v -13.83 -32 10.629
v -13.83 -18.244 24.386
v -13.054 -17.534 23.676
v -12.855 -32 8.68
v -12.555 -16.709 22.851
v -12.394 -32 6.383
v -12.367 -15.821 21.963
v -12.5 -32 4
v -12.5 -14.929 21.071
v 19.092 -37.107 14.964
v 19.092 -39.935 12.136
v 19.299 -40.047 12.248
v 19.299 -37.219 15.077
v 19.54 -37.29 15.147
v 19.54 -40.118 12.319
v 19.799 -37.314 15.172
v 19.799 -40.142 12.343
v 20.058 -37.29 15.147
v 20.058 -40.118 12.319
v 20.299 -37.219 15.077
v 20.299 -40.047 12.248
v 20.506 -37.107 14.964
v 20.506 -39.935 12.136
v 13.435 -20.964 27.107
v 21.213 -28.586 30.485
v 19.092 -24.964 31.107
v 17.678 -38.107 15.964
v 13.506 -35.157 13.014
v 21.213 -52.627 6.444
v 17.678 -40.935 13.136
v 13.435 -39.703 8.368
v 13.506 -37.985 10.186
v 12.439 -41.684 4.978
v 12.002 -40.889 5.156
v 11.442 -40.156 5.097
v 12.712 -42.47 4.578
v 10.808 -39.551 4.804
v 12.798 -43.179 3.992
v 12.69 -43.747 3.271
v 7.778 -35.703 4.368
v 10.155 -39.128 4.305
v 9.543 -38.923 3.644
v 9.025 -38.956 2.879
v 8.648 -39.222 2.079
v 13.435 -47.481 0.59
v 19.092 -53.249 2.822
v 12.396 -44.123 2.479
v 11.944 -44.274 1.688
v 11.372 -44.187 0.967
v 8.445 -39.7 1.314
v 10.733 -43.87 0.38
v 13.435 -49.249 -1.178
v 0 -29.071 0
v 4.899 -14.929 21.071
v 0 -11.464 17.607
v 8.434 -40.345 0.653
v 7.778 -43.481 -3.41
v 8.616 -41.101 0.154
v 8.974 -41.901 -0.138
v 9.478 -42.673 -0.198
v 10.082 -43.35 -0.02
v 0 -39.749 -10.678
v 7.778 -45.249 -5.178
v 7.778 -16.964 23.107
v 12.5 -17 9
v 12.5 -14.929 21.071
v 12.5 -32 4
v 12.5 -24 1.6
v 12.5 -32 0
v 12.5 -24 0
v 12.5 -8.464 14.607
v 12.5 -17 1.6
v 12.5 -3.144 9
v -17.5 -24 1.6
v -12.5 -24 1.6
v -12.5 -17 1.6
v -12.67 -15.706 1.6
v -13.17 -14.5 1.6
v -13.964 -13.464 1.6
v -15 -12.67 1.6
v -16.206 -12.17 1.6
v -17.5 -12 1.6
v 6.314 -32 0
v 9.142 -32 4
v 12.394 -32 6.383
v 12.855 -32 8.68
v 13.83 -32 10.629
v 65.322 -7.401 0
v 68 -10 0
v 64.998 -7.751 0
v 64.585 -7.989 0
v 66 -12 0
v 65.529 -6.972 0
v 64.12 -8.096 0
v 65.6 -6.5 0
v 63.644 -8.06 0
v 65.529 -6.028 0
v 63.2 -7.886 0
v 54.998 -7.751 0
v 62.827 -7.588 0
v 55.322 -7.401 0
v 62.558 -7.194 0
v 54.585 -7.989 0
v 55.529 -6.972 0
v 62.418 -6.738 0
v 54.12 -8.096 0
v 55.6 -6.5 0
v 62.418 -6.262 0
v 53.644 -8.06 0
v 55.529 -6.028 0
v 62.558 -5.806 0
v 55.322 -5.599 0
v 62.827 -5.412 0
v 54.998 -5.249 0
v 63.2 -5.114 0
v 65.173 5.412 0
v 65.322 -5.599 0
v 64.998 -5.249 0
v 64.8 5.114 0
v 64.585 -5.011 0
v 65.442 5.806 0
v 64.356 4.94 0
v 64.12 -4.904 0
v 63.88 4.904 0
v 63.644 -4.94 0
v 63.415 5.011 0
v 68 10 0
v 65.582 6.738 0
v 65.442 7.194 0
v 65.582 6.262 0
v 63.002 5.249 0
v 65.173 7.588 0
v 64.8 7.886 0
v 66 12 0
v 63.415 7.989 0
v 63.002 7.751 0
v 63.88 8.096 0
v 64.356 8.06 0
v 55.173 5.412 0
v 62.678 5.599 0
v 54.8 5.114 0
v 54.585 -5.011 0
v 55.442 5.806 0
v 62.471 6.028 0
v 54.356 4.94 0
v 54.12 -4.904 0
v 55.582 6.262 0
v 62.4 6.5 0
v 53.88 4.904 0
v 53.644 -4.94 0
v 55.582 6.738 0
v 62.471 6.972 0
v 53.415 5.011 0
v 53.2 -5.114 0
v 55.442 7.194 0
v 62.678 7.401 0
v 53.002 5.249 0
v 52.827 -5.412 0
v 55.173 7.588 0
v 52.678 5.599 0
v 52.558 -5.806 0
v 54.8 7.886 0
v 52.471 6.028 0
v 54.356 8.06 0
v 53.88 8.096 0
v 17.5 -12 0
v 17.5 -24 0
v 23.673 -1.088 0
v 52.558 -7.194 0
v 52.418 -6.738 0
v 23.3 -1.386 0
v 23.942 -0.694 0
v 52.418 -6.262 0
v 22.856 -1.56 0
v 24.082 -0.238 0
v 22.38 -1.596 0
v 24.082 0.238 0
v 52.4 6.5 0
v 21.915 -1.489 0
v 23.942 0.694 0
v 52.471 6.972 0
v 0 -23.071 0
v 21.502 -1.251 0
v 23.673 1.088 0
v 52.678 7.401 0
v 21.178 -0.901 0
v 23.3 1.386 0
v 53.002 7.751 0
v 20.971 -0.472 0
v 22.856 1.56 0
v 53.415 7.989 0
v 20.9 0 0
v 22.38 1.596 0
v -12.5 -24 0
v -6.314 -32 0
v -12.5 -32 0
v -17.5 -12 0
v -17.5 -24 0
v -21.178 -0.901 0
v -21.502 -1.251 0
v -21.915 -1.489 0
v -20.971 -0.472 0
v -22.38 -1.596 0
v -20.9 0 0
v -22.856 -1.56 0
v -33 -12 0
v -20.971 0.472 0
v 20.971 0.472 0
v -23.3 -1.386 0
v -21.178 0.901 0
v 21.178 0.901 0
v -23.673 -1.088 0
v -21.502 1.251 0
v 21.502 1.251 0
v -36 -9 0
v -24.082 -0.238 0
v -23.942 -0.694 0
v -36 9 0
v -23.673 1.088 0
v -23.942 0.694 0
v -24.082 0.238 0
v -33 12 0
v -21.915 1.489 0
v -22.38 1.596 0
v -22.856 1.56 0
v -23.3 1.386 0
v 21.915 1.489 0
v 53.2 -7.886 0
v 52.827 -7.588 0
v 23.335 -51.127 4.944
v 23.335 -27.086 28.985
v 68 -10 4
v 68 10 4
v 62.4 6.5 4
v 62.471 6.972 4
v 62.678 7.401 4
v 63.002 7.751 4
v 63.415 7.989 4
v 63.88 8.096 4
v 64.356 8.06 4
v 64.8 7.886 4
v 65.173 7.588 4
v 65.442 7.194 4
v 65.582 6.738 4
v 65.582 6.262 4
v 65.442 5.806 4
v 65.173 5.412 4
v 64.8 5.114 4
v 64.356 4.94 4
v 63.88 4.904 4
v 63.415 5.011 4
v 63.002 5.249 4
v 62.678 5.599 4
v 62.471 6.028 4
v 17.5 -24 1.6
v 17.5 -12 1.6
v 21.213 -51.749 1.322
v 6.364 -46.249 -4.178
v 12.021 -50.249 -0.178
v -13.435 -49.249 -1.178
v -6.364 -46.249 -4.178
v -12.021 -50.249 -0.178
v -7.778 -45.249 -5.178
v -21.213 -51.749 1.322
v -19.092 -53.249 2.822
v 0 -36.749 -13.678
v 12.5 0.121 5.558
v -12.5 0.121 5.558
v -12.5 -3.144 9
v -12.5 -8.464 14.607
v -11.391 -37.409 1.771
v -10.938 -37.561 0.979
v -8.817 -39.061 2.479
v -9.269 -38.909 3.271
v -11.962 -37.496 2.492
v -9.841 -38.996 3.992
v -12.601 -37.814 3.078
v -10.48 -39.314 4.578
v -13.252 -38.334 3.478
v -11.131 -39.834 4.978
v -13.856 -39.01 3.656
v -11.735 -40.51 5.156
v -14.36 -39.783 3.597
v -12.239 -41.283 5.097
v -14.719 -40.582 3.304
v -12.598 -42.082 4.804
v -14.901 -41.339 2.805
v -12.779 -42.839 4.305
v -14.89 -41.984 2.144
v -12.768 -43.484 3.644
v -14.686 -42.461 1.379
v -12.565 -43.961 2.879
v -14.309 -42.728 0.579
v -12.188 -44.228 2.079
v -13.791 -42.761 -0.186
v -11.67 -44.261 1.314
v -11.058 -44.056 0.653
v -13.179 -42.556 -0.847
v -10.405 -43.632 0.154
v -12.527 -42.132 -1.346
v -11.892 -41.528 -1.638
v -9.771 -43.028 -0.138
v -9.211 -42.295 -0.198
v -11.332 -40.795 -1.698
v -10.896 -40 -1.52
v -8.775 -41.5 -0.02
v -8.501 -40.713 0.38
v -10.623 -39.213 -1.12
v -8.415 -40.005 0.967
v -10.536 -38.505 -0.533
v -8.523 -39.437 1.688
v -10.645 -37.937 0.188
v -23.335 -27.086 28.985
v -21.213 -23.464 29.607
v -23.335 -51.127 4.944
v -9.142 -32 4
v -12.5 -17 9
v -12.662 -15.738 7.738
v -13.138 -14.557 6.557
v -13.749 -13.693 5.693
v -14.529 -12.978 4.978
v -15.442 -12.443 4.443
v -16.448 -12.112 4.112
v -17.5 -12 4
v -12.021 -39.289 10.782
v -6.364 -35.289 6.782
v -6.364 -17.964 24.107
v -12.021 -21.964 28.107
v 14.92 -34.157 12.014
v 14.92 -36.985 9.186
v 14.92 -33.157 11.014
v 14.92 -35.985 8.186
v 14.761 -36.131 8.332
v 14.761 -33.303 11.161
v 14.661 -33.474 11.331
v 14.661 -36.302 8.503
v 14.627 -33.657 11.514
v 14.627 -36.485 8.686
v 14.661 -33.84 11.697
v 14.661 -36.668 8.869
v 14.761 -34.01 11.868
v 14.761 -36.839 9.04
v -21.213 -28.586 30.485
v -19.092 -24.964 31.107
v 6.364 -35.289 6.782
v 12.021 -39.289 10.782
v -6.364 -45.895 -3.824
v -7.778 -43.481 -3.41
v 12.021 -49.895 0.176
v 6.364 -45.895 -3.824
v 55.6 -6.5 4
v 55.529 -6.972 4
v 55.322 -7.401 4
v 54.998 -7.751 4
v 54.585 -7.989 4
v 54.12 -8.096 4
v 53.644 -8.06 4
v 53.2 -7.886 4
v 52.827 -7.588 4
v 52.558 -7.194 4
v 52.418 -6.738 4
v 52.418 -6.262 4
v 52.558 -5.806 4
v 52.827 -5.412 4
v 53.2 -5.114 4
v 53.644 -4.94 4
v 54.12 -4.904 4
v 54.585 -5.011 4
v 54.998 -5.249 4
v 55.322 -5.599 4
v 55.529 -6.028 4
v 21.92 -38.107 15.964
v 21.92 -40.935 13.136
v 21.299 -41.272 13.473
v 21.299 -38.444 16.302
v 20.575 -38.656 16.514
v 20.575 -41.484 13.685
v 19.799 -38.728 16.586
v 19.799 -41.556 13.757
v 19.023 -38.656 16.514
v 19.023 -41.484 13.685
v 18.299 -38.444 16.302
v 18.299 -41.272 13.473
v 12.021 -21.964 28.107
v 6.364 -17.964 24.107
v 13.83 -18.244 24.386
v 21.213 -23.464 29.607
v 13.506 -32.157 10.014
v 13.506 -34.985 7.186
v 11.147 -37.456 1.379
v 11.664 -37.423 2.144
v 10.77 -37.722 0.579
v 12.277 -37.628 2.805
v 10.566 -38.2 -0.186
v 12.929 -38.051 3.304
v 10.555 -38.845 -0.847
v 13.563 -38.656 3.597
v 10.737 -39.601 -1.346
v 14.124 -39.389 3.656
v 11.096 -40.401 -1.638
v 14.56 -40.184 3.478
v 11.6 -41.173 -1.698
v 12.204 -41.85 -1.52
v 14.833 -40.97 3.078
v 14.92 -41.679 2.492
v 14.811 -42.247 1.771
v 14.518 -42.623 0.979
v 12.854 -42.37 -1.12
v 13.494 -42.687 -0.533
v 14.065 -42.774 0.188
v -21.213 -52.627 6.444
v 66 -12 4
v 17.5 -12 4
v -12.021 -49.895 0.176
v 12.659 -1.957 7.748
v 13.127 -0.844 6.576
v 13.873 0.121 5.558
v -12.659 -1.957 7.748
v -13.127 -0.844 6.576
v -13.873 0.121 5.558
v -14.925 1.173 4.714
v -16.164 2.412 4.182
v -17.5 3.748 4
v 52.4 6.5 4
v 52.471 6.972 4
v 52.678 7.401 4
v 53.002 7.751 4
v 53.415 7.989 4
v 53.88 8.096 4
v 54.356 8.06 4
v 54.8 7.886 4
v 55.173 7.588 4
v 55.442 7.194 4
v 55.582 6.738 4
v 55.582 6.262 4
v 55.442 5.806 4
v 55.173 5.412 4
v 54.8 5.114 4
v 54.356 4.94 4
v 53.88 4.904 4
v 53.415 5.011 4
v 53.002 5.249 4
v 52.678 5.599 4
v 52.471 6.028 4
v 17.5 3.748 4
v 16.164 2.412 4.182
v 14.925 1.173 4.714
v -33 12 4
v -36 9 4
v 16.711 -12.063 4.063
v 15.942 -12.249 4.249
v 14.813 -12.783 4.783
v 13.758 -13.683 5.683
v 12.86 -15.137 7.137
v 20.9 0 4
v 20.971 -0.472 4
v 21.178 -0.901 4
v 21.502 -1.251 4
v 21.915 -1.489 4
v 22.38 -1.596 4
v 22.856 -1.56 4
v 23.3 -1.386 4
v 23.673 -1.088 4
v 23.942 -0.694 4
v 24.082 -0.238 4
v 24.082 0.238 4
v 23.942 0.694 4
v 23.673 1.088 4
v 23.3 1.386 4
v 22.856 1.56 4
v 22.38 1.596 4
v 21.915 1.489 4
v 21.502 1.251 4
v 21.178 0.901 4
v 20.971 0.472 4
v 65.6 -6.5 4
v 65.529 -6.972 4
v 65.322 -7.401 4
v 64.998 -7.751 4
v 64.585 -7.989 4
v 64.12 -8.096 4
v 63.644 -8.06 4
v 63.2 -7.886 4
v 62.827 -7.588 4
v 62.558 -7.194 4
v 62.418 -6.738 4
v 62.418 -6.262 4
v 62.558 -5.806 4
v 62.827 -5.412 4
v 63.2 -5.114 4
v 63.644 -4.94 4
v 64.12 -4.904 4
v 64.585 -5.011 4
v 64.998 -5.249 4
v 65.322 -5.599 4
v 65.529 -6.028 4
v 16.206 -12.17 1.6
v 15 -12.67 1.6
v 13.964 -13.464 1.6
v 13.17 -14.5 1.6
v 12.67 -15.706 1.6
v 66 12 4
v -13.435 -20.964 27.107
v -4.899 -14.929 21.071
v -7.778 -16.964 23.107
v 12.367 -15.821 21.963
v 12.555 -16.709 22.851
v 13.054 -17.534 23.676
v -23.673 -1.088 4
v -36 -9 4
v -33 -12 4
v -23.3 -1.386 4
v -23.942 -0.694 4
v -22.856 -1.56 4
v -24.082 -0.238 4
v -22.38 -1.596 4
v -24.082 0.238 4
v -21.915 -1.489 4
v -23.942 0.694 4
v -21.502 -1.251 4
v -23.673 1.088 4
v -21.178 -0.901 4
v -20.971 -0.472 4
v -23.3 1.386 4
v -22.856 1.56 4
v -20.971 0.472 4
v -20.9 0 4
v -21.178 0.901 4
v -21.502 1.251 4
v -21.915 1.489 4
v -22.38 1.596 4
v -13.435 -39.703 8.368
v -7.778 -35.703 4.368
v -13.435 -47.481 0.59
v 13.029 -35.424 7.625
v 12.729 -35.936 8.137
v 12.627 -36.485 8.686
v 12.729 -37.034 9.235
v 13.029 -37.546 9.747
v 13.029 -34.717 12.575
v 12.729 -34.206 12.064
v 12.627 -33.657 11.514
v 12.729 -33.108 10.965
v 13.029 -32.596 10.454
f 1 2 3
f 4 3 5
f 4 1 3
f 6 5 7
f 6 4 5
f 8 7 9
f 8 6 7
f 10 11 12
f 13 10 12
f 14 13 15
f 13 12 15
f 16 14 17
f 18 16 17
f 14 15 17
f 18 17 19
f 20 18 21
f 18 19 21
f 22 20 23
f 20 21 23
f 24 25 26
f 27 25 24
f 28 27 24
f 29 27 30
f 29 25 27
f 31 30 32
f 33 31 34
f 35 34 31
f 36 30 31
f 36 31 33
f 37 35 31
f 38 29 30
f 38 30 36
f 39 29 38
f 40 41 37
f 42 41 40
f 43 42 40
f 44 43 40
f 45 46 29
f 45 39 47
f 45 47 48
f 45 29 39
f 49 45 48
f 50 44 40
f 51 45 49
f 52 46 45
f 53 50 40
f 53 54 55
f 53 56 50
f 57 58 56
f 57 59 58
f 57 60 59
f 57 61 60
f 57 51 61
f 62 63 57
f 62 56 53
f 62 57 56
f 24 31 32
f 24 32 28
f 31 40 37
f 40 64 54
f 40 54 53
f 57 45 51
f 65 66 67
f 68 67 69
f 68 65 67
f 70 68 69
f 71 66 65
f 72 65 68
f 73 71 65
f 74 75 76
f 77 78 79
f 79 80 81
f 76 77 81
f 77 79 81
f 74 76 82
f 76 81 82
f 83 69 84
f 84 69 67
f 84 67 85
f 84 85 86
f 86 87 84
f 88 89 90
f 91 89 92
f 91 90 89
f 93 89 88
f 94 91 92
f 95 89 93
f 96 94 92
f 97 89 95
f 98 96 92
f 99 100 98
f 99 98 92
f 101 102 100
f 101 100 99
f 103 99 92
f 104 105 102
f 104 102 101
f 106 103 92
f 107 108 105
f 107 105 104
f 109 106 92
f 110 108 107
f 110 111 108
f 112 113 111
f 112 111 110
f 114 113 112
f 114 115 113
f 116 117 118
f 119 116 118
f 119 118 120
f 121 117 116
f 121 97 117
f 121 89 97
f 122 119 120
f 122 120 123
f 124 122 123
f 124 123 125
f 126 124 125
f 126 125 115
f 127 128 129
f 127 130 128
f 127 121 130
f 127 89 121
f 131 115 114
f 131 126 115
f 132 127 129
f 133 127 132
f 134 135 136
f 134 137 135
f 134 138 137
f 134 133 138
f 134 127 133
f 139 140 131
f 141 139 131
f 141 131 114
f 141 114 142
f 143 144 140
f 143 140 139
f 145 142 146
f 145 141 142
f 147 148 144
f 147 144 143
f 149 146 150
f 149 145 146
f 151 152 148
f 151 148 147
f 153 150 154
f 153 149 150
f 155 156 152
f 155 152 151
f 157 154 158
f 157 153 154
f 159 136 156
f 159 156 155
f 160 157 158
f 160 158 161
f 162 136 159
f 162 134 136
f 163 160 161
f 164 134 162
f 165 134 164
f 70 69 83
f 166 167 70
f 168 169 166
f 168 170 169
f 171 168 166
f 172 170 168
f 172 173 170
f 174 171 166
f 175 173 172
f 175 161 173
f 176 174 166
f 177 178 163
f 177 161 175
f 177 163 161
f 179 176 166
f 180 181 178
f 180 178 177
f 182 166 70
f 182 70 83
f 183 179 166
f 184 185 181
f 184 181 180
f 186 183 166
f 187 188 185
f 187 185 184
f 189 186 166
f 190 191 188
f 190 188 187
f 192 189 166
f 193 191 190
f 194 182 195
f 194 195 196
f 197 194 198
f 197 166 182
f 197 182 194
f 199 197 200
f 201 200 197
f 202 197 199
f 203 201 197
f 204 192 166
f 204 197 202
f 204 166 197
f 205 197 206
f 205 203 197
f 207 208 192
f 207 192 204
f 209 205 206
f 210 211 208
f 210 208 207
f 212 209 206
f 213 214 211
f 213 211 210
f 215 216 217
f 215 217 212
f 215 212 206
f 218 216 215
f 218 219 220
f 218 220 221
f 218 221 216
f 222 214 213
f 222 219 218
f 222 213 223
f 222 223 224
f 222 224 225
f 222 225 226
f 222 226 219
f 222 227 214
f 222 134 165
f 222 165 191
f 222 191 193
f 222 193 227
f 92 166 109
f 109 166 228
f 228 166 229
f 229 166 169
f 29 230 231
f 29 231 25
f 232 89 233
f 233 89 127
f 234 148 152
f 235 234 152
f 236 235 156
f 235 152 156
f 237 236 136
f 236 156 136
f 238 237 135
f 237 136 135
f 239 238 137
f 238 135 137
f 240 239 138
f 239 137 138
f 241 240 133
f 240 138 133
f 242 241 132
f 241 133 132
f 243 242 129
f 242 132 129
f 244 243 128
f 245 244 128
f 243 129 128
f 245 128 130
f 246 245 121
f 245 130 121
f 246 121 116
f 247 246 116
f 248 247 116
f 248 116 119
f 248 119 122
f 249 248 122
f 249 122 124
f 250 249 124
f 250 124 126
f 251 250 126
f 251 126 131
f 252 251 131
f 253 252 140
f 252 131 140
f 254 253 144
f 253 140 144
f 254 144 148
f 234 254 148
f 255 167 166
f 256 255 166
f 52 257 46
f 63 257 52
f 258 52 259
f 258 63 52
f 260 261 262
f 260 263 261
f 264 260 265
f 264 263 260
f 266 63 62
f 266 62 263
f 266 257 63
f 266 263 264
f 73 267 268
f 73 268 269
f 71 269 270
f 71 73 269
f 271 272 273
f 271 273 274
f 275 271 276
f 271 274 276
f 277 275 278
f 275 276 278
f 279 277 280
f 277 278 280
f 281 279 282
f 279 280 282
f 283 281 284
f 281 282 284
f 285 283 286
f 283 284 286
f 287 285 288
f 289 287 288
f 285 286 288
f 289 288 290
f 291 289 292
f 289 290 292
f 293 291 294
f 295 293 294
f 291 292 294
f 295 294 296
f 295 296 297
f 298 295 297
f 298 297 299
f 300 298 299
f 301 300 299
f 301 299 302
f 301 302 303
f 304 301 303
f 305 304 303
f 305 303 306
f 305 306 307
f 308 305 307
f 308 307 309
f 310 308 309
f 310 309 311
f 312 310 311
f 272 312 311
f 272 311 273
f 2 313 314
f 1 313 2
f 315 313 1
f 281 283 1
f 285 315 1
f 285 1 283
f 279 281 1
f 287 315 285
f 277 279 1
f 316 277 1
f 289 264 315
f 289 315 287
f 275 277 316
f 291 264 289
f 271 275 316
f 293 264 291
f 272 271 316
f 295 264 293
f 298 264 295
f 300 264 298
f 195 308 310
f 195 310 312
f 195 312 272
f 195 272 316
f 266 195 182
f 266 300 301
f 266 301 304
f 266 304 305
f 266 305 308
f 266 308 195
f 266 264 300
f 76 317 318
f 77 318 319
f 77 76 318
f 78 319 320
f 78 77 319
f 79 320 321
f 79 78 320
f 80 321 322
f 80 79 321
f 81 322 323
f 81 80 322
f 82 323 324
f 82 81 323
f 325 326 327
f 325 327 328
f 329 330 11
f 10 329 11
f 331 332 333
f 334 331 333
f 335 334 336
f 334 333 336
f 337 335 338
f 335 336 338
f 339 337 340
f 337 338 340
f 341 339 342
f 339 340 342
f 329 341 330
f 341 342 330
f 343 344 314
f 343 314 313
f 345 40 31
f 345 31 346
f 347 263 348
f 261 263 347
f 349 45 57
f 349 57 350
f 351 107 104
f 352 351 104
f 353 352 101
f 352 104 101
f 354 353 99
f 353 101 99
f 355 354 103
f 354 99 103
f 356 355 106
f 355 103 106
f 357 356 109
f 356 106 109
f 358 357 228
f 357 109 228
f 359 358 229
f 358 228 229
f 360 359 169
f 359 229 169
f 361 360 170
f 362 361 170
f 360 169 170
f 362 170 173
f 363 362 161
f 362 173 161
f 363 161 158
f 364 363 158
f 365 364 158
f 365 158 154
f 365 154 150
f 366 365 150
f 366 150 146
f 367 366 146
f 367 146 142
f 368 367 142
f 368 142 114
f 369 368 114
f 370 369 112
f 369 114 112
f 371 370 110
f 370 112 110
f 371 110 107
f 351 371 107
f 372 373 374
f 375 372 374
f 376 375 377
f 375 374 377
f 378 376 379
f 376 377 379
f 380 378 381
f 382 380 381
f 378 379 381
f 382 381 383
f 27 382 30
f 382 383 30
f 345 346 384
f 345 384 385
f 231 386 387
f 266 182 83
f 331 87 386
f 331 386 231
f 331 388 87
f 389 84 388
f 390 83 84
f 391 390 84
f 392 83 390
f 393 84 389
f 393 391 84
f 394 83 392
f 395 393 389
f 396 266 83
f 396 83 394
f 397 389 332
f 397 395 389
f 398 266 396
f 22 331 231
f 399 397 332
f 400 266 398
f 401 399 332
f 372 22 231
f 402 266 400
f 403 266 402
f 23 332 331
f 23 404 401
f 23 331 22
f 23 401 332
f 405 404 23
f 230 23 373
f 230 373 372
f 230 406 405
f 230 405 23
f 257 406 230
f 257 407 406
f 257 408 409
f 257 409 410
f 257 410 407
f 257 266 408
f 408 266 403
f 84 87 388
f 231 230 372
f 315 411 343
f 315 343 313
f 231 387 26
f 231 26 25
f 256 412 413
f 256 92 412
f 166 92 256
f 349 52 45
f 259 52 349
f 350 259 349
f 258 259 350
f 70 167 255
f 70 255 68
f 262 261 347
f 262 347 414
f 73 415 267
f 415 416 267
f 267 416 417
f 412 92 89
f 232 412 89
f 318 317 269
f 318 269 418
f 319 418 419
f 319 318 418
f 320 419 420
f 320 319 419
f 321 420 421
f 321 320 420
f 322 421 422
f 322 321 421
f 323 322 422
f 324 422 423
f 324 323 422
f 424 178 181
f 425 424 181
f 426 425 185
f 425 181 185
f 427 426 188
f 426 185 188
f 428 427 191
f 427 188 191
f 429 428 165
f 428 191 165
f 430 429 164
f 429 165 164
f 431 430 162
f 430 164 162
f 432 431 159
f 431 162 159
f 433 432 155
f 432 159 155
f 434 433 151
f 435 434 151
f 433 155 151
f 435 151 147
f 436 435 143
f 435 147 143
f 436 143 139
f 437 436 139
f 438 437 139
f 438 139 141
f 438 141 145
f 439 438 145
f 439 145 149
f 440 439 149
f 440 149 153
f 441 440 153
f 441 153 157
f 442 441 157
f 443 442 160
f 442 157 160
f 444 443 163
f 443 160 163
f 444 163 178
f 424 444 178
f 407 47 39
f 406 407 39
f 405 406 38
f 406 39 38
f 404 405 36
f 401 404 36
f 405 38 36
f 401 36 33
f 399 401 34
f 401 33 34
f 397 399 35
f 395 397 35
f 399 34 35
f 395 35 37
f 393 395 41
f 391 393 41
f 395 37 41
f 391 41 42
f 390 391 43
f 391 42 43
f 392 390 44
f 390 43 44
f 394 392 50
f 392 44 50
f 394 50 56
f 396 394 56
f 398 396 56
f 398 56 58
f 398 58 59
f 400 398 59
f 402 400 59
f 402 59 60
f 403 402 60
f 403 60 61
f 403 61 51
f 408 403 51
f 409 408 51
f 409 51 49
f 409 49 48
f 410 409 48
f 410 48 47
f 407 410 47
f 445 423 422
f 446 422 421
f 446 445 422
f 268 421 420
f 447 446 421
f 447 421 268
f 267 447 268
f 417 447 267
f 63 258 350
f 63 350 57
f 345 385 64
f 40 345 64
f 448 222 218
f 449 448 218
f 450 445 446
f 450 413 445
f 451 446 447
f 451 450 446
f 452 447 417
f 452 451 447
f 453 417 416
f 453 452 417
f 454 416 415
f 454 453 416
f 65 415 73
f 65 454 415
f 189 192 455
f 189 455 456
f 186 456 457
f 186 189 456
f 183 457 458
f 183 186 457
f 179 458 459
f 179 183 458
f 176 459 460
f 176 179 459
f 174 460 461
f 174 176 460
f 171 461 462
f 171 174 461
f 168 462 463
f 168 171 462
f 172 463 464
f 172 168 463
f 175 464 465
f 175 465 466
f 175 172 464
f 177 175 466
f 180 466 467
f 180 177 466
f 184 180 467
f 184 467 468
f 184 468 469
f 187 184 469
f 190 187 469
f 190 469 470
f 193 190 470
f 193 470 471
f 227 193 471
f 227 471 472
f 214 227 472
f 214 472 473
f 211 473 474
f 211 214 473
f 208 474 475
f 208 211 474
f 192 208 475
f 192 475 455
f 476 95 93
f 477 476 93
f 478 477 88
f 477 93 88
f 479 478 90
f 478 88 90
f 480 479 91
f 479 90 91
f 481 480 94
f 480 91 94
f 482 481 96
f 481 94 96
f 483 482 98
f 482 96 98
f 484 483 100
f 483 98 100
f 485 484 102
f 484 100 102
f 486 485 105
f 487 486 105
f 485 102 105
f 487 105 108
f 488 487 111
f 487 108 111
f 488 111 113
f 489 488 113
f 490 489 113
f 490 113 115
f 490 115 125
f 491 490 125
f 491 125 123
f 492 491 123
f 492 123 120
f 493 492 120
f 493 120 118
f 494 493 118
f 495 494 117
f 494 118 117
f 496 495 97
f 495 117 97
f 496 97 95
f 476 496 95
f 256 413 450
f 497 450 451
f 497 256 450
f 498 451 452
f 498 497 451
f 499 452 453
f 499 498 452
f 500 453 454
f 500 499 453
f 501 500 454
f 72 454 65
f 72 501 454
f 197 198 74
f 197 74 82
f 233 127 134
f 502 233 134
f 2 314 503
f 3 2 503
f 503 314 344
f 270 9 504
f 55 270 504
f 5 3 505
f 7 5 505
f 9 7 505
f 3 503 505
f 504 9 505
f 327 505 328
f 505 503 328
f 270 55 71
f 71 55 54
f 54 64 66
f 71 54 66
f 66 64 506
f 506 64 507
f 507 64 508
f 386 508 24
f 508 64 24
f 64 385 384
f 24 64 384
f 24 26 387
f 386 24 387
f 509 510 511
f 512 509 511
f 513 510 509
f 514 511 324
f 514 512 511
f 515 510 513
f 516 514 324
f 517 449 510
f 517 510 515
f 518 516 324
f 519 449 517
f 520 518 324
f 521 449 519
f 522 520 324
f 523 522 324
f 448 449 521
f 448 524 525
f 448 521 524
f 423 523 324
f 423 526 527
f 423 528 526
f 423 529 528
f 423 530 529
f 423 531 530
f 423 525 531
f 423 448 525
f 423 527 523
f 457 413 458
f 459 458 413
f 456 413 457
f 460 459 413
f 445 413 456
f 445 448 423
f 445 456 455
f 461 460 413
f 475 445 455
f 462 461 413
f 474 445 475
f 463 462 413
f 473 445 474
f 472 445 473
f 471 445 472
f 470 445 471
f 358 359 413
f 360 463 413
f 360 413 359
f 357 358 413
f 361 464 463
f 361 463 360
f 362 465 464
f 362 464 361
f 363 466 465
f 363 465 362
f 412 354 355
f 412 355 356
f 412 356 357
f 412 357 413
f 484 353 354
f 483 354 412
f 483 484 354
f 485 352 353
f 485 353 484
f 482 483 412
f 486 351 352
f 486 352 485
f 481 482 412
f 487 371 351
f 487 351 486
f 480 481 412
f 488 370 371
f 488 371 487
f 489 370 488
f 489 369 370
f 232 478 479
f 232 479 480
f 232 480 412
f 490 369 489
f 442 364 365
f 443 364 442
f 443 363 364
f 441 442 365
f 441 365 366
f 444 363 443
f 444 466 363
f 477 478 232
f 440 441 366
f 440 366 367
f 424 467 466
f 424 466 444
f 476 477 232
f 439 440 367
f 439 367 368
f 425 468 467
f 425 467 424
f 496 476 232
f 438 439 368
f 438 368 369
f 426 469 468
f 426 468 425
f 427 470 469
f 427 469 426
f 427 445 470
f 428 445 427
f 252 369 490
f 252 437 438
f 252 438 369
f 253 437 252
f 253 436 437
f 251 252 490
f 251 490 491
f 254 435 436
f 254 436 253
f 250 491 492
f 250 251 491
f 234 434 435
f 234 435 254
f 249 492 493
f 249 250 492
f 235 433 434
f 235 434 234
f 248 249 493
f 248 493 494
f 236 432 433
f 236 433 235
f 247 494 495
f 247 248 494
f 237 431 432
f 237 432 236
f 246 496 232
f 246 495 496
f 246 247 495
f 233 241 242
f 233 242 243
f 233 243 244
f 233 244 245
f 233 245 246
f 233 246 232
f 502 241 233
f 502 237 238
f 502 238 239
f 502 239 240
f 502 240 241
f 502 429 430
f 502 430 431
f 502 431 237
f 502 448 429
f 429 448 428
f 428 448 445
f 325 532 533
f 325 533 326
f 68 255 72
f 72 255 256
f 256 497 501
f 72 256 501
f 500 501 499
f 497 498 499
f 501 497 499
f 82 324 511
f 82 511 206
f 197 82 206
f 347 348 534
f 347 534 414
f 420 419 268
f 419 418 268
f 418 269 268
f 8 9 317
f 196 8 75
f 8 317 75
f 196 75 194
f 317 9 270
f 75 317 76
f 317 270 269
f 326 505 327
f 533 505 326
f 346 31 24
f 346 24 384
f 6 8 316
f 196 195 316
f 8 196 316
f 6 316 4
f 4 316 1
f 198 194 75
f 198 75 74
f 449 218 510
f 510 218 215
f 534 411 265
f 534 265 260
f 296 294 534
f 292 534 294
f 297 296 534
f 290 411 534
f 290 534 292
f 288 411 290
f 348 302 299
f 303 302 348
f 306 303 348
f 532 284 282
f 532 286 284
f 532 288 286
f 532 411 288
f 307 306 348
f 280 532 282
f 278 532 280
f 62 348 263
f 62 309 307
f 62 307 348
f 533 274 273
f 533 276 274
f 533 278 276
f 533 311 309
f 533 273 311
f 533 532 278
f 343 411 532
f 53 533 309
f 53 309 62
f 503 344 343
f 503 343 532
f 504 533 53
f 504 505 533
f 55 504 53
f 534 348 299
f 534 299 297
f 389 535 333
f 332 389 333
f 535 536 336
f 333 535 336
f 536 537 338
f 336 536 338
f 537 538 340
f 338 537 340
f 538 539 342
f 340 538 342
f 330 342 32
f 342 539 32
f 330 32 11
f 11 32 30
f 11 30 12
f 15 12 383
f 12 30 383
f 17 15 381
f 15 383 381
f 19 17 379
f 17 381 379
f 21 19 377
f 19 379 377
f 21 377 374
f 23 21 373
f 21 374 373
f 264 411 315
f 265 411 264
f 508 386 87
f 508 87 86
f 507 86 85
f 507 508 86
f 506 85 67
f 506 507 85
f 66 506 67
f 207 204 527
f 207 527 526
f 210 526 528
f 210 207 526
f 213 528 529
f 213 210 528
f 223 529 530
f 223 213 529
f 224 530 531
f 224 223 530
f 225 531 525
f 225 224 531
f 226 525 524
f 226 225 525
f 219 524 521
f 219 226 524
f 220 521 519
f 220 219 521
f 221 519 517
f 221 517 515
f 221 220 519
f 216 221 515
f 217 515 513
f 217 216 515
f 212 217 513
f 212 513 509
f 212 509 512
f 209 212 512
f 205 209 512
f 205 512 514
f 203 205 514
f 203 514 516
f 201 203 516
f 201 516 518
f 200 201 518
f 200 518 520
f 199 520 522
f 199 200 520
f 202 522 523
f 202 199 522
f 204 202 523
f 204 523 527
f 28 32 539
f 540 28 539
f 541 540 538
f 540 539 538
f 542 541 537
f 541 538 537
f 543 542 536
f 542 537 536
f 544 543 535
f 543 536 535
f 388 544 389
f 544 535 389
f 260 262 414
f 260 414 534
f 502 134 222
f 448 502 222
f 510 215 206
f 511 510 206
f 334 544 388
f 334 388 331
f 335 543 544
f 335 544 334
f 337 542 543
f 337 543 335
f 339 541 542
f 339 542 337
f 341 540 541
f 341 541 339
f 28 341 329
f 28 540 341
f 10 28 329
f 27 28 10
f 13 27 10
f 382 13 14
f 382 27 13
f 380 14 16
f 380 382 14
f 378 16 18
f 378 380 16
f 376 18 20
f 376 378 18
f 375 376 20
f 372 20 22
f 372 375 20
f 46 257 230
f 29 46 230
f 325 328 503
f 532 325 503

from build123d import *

# Parameters (mm, degrees)
CROQUIS1_R                   = 1.6
SALIENTE_EXTRUIR1_DEPTH      = 4
CROQUIS3_R                   = 1.6
SALIENTE_EXTRUIR3_DEPTH      = 4
SALIENTE_EXTRUIR4_DEPTH      = 10
SALIENTE_EXTRUIR4_DEPTH_BACK = 30
CORTAR_EXTRUIR8_REACH        = 97.414
CROQUIS13_R                  = 3.1
CORTAR_EXTRUIR9_DEPTH        = 2
CORTAR_EXTRUIR10_REACH       = 83.858
CROQUIS15_R                  = 3.1
CORTAR_EXTRUIR11_DEPTH       = 2
SALIENTE_EXTRUIR5_DEPTH      = 12.5
CORTAR_EXTRUIR12_DEPTH       = 95.018496218
REDONDEO1_R                  = 5
CHAFL_N1_SIZE                = 3
CROQUIS20_W                  = 35
CROQUIS20_H                  = 12
SALIENTE_EXTRUIR6_DEPTH      = 1.6
CORTAR_EXTRUIR13_START       = -16
CORTAR_EXTRUIR13_DEPTH       = 4


with BuildPart() as part:
    # Croquis1 → Saliente-Extruir1 (new body)
    with BuildSketch(Plane.XY):
        Polygon((12.5, -12), (36, -12), (36, 12), (-36, 12), (-36, -12), (-12.5, -12), (-12.5, -32), (12.5, -32), align=None)
        with Locations((-22.5, 0)):
            Circle(CROQUIS1_R, mode=Mode.SUBTRACT)
        with Locations(Location((22.5, 0, 0), (0, 0, 180))):
            Circle(CROQUIS1_R, mode=Mode.SUBTRACT)
    extrude(amount=SALIENTE_EXTRUIR1_DEPTH)

    # Croquis3 → Saliente-Extruir3 (add)
    with BuildSketch(Plane(origin=(0, 0, 0), x_dir=(-1, 0, 0), z_dir=(0, 0, -1))):
        Polygon((-66, 12), (-36, 12), (-36, -12), (-66, -12), (-68, -10), (-68, 10), align=None)
        with Locations((-54, 6.5)):
            Circle(CROQUIS3_R, mode=Mode.SUBTRACT)
        with Locations((-64, 6.5)):
            Circle(CROQUIS3_R, mode=Mode.SUBTRACT)
        with Locations(Location((-54, -6.5, 0), (0, 0, 180))):
            Circle(CROQUIS3_R, mode=Mode.SUBTRACT)
        with Locations(Location((-64, -6.5, 0), (0, 0, 180))):
            Circle(CROQUIS3_R, mode=Mode.SUBTRACT)
    extrude(amount=-SALIENTE_EXTRUIR3_DEPTH)

    # Croquis5 → Saliente-Extruir4 (add, two sides: drawn at the far end of the back side and taken through both)
    with BuildSketch(Plane(origin=(0, -4.201010127, -3.798989873), x_dir=(1, 0, 0), z_dir=(0, 0.7071067811865438, 0.7071067811865512)).offset(-SALIENTE_EXTRUIR4_DEPTH_BACK)):
        Polygon((-13.435028843, -33.707106781), (-21.213203436, -41.485281374), (-23.334523779, -39.363961031), (0, -16.029437252), (23.334523779, -39.363961031), (21.213203436, -41.485281374), (13.435028843, -33.707106781), (12.02081528, -35.121320344), (6.363961031, -29.464466094), (7.778174593, -28.050252532), (0, -20.272077939), (-7.778174593, -28.050252532), (-6.363961031, -29.464466094), (-12.02081528, -35.121320344), align=None)
    extrude(amount=SALIENTE_EXTRUIR4_DEPTH + SALIENTE_EXTRUIR4_DEPTH_BACK)

    # Croquis13 → Cortar-Extruir8 (cut, up to next)
    with BuildSketch(Plane(origin=(-11.692388155, -8.267766953, 8.267766953), x_dir=(0.40824829046385985, 0.2886751345948103, 0.866025403784441), z_dir=(-0.7071067811865496, -0.5000000000000013, 0.4999999999999959)), mode=Mode.PRIVATE) as cortar_extruir8_sk1:
        with Locations(Location((-5.529378483, -40.083354696, 0), (0, 0, 270))):
            Circle(CROQUIS13_R)
    cortar_extruir8_tool1 = extrude(cortar_extruir8_sk1.sketch, amount=-CORTAR_EXTRUIR8_REACH, mode=Mode.PRIVATE) & part.part
    add(cortar_extruir8_tool1.solids().sort_by_distance((9.192388, -42.591883, 3.479185))[0], mode=Mode.SUBTRACT)

    # Croquis14 → Cortar-Extruir9 (cut)
    with BuildSketch(Plane(origin=(-11.692388155, -8.267766953, 8.267766953), x_dir=(0.40824829046385985, 0.2886751345948103, 0.866025403784441), z_dir=(-0.7071067811865496, -0.5000000000000013, 0.4999999999999959))):
        Polygon((-11.513014174, -39.415444584), (-6.89421202, -45.947417231), (0.454257208, -40.751264808), (-4.164544945, -34.219292161), align=None)
    extrude(amount=-CORTAR_EXTRUIR9_DEPTH, mode=Mode.SUBTRACT)

    # Croquis15 → Cortar-Extruir10 (cut, up to next)
    with BuildSketch(Plane(origin=(8.62825877, -6.101100286, 14.767766953), x_dir=(0.6666666666666553, 0.23570226039552375, -0.7071067811865557), z_dir=(0.7071067811865587, -0.49999999999999484, 0.4999999999999895)), mode=Mode.PRIVATE) as cortar_extruir10_sk1:
        with Locations(Location((-12.499158228, -40.25364355, 0), (0, 0, 54.735610317))):
            Circle(CROQUIS15_R)
    cortar_extruir10_tool1 = extrude(cortar_extruir10_sk1.sketch, amount=-CORTAR_EXTRUIR10_REACH, mode=Mode.PRIVATE) & part.part
    add(cortar_extruir10_tool1.solids().sort_by_distance((-9.192388, -42.591883, 3.479185))[0], mode=Mode.SUBTRACT)

    # Croquis17 → Cortar-Extruir11 (cut)
    with BuildSketch(Plane(origin=(8.62825877, -6.101100286, 14.767766953), x_dir=(0.6666666666666595, 0.2357022603955385, -0.7071067811865467), z_dir=(0.7071067811865586, -0.4999999999999948, 0.49999999999998956))):
        Polygon((-14.770394394, -45.829617571), (-7.227922061, -43.162950904), (-10.227922061, -34.67766953), (-17.770394394, -37.344336196), align=None)
    extrude(amount=-CORTAR_EXTRUIR11_DEPTH, mode=Mode.SUBTRACT)

    # Croquis19 → Saliente-Extruir5 (add, symmetric)
    with BuildSketch(Plane(origin=(0, 0, 0), x_dir=(0, 0, -1), z_dir=(1, 0, 0))):
        Polygon((-14.606601718, -8.464466094), (-21.071067812, -14.928932188), (-4, -32), (-4, 1.6), align=None)
    extrude(amount=SALIENTE_EXTRUIR5_DEPTH, both=True)

    # Croquis18 → Cortar-Extruir12 (cut, through all)
    with BuildSketch(Plane(origin=(0, 3.071067812, 3.071067812), x_dir=(1, 0, 0), z_dir=(0, 0.7071067811865438, 0.7071067811865513))):
        Polygon((0, -20.556349186), (4.899494937, -25.455844123), (-4.899494937, -25.455844123), align=None)
    extrude(amount=-CORTAR_EXTRUIR12_DEPTH, mode=Mode.SUBTRACT)

    # Redondeo1
    # the kernel refuses this fillet: 5 mm, written as the material it adds along each edge
    with BuildSketch(Plane(origin=(12.5, -12, 4), x_dir=(1, 0, 0), z_dir=(0, 1, 0))) as redondeo1_piece_1_section:
        with BuildLine():
            CenterArc((REDONDEO1_R, -REDONDEO1_R), REDONDEO1_R, 90, 90)
            Line((0, -REDONDEO1_R), (0, 0))
            Line((0, 0), (REDONDEO1_R, 0))
        make_face()
    redondeo1_piece_1 = extrude(amount=26.1, mode=Mode.PRIVATE)
    redondeo1_piece_1 = split(redondeo1_piece_1, bisect_by=Plane(origin=(12.5, -4.843560917, 10.790651749), z_dir=(0, -0.7254024787176051, -0.6883249551413595)), keep=Keep.TOP, mode=Mode.PRIVATE)
    add(redondeo1_piece_1)
    with BuildSketch(Plane(origin=(-12.5, -12, 4), x_dir=(0, 0, 1), z_dir=(0, 1, 0))) as redondeo1_piece_2_section:
        with BuildLine():
            CenterArc((REDONDEO1_R, -REDONDEO1_R), REDONDEO1_R, 90, 90)
            Line((0, -REDONDEO1_R), (0, 0))
            Line((0, 0), (REDONDEO1_R, 0))
        make_face()
    redondeo1_piece_2 = extrude(amount=26.1, mode=Mode.PRIVATE)
    redondeo1_piece_2 = split(redondeo1_piece_2, bisect_by=Plane(origin=(-12.5, -4.843560917, 10.790651749), z_dir=(0, -0.7254024787176051, -0.6883249551413595)), keep=Keep.TOP, mode=Mode.PRIVATE)
    add(redondeo1_piece_2)
    with BuildSketch(Plane(origin=(9.142135624, -14.928932188, 21.071067812), x_dir=(1, 0, 0), z_dir=(5.181305113656439e-15, -0.7071067811865475, -0.7071067811865476))) as redondeo1_piece_3_section:
        with BuildLine():
            CenterArc((8.223291456, 1.152223645), REDONDEO1_R, 135, 58.323256203)
            Line((4.687757551, 4.687757551), (0, 0))
            Line((0, 0), (3.357864376, 0))
        make_face()
    redondeo1_piece_3 = extrude(amount=40.715861386, mode=Mode.PRIVATE)
    redondeo1_piece_3 = split(redondeo1_piece_3, bisect_by=Plane(origin=(9.142135624, -32, 21.071067812), z_dir=(0, 1, 0)), keep=Keep.TOP, mode=Mode.PRIVATE)
    add(redondeo1_piece_3)
    with BuildSketch(Plane(origin=(-9.142135624, -43.719393876, -7.719393876), x_dir=(-1, 0, 0), z_dir=(5.181305113656437e-15, 0.7071067811865476, 0.7071067811865476))) as redondeo1_piece_4_section:
        with BuildLine():
            CenterArc((8.223291456, 1.152223645), REDONDEO1_R, 135, 58.323256203)
            Line((4.687757551, 4.687757551), (0, 0))
            Line((0, 0), (3.357864376, 0))
        make_face()
    redondeo1_piece_4 = extrude(amount=40.715861386, mode=Mode.PRIVATE)
    redondeo1_piece_4 = split(redondeo1_piece_4, bisect_by=Plane(origin=(-9.142135624, -32, -7.719393876), z_dir=(0, 1, 0)), keep=Keep.TOP, mode=Mode.PRIVATE)
    add(redondeo1_piece_4)
    with BuildSketch(Plane(origin=(-12.5, -12, 0), x_dir=(-1, 0, 0), z_dir=(0, 0, 1))) as redondeo1_piece_5:
        with BuildLine():
            CenterArc((REDONDEO1_R, REDONDEO1_R), REDONDEO1_R, 180, 90)
            Line((0, REDONDEO1_R), (0, 0))
            Line((0, 0), (REDONDEO1_R, 0))
        make_face()
    extrude(amount=4)
    with BuildSketch(Plane(origin=(12.5, -12, 0), x_dir=(1, 0, 0), z_dir=(0, 0, 1))) as redondeo1_piece_6:
        with BuildLine():
            CenterArc((REDONDEO1_R, -REDONDEO1_R), REDONDEO1_R, 90, 90)
            Line((0, -REDONDEO1_R), (0, 0))
            Line((0, 0), (REDONDEO1_R, 0))
        make_face()
    extrude(amount=4)
    with BuildSketch(Plane(origin=(12.5, 1.6, 4), x_dir=(0, -0.6883249551413598, 0.725402478717605), z_dir=(-1, 0, 0))) as redondeo1_piece_7:
        with BuildLine():
            CenterArc((REDONDEO1_R * 0.429658091891, REDONDEO1_R), REDONDEO1_R, 223.497660381, 46.502339619)
            Line((-REDONDEO1_R * 0.295744386827, REDONDEO1_R * 0.311675044859), (0, 0))
            Line((0, 0), (REDONDEO1_R * 0.429658091891, 0))
        make_face()
    extrude(amount=25)
    with BuildSketch(Plane(origin=(12.5, -12, 0), x_dir=(1, 0, 0), z_dir=(0, 0, 1))) as redondeo1_piece_8a_section:
        with BuildLine():
            CenterArc((REDONDEO1_R, -REDONDEO1_R), REDONDEO1_R, 90, 90)
            Line((0, -REDONDEO1_R), (0, 0))
            Line((0, 0), (REDONDEO1_R, 0))
        make_face()
    redondeo1_piece_8a = extrude(amount=16.5, mode=Mode.PRIVATE)
    redondeo1_piece_8a = split(redondeo1_piece_8a, bisect_by=Plane(origin=(12.5, -12, 4), z_dir=(0, 0, 1)), keep=Keep.TOP, mode=Mode.PRIVATE)
    with BuildSketch(Plane(origin=(12.5, -24.5, 4), x_dir=(1, 0, 0), z_dir=(0, 1, 0))) as redondeo1_piece_8b_section:
        with BuildLine():
            CenterArc((REDONDEO1_R, -REDONDEO1_R), REDONDEO1_R, 90, 90)
            Line((0, -REDONDEO1_R), (0, 0))
            Line((0, 0), (REDONDEO1_R, 0))
        make_face()
    redondeo1_piece_8b = extrude(amount=38.6, mode=Mode.PRIVATE)
    redondeo1_piece_8b = split(redondeo1_piece_8b, bisect_by=Plane(origin=(12.5, -12, 4), z_dir=(0, -1, 0)), keep=Keep.TOP, mode=Mode.PRIVATE)
    redondeo1_piece_8 = redondeo1_piece_8a & redondeo1_piece_8b
    add(redondeo1_piece_8)
    with BuildSketch(Plane(origin=(17.870726149, 1.6, 4), x_dir=(0, -0.6883249551413598, 0.725402478717605), z_dir=(-1, 0, 0))) as redondeo1_piece_9a_section:
        with BuildLine():
            CenterArc((REDONDEO1_R * 0.429658091891, REDONDEO1_R), REDONDEO1_R, 223.497660381, 46.502339619)
            Line((-REDONDEO1_R * 0.295744386827, REDONDEO1_R * 0.311675044859), (0, 0))
            Line((0, 0), (REDONDEO1_R * 0.429658091891, 0))
        make_face()
    redondeo1_piece_9a = extrude(amount=30.370726149, mode=Mode.PRIVATE)
    redondeo1_piece_9a = split(redondeo1_piece_9a, bisect_by=Plane(origin=(12.5, 1.6, 4), z_dir=(1, 0, 0)), keep=Keep.TOP, mode=Mode.PRIVATE)
    with BuildSketch(Plane(origin=(12.5, -12, 4), x_dir=(1, 0, 0), z_dir=(0, 1, 0))) as redondeo1_piece_9b_section:
        with BuildLine():
            CenterArc((REDONDEO1_R, -REDONDEO1_R), REDONDEO1_R, 90, 90)
            Line((0, -REDONDEO1_R), (0, 0))
            Line((0, 0), (REDONDEO1_R, 0))
        make_face()
    redondeo1_piece_9b = extrude(amount=26.1, mode=Mode.PRIVATE)
    redondeo1_piece_9b = split(redondeo1_piece_9b, bisect_by=Plane(origin=(12.5, 12, 4), z_dir=(0, -1, 0)), keep=Keep.TOP, mode=Mode.PRIVATE)
    redondeo1_piece_9b = split(redondeo1_piece_9b, bisect_by=Plane(origin=(12.5, -4.843560917, 10.790651749), z_dir=(0, 0.7254024787176051, 0.6883249551413595)), keep=Keep.TOP, mode=Mode.PRIVATE)
    redondeo1_piece_9 = redondeo1_piece_9a & redondeo1_piece_9b
    add(redondeo1_piece_9)
    with BuildSketch(Plane(origin=(-12.5, -12, 0), x_dir=(-1, 0, 0), z_dir=(0, 0, 1))) as redondeo1_piece_10a_section:
        with BuildLine():
            CenterArc((REDONDEO1_R, REDONDEO1_R), REDONDEO1_R, 180, 90)
            Line((0, REDONDEO1_R), (0, 0))
            Line((0, 0), (REDONDEO1_R, 0))
        make_face()
    redondeo1_piece_10a = extrude(amount=16.5, mode=Mode.PRIVATE)
    redondeo1_piece_10a = split(redondeo1_piece_10a, bisect_by=Plane(origin=(-12.5, -12, 4), z_dir=(0, 0, 1)), keep=Keep.TOP, mode=Mode.PRIVATE)
    with BuildSketch(Plane(origin=(-12.5, -24.5, 4), x_dir=(0, 0, 1), z_dir=(0, 1, 0))) as redondeo1_piece_10b_section:
        with BuildLine():
            CenterArc((REDONDEO1_R, -REDONDEO1_R), REDONDEO1_R, 90, 90)
            Line((0, -REDONDEO1_R), (0, 0))
            Line((0, 0), (REDONDEO1_R, 0))
        make_face()
    redondeo1_piece_10b = extrude(amount=38.6, mode=Mode.PRIVATE)
    redondeo1_piece_10b = split(redondeo1_piece_10b, bisect_by=Plane(origin=(-12.5, -12, 4), z_dir=(0, -1, 0)), keep=Keep.TOP, mode=Mode.PRIVATE)
    redondeo1_piece_10 = redondeo1_piece_10a & redondeo1_piece_10b
    add(redondeo1_piece_10)
    with BuildSketch(Plane(origin=(-12.5, -12, 4), x_dir=(0, 0, 1), z_dir=(0, 1, 0))) as redondeo1_piece_11a_section:
        with BuildLine():
            CenterArc((REDONDEO1_R, -REDONDEO1_R), REDONDEO1_R, 90, 90)
            Line((0, -REDONDEO1_R), (0, 0))
            Line((0, 0), (REDONDEO1_R, 0))
        make_face()
    redondeo1_piece_11a = extrude(amount=26.1, mode=Mode.PRIVATE)
    redondeo1_piece_11a = split(redondeo1_piece_11a, bisect_by=Plane(origin=(-12.5, 12, 4), z_dir=(0, -1, 0)), keep=Keep.TOP, mode=Mode.PRIVATE)
    redondeo1_piece_11a = split(redondeo1_piece_11a, bisect_by=Plane(origin=(-12.5, -4.843560917, 10.790651749), z_dir=(0, 0.7254024787176051, 0.6883249551413595)), keep=Keep.TOP, mode=Mode.PRIVATE)
    with BuildSketch(Plane(origin=(12.5, 1.6, 4), x_dir=(0, -0.6883249551413598, 0.725402478717605), z_dir=(-1, 0, 0))) as redondeo1_piece_11b_section:
        with BuildLine():
            CenterArc((REDONDEO1_R * 0.429658091891, REDONDEO1_R), REDONDEO1_R, 223.497660381, 46.502339619)
            Line((-REDONDEO1_R * 0.295744386827, REDONDEO1_R * 0.311675044859), (0, 0))
            Line((0, 0), (REDONDEO1_R * 0.429658091891, 0))
        make_face()
    redondeo1_piece_11b = extrude(amount=30.370726149, mode=Mode.PRIVATE)
    redondeo1_piece_11b = split(redondeo1_piece_11b, bisect_by=Plane(origin=(-12.5, 1.6, 4), z_dir=(-1, 0, 0)), keep=Keep.TOP, mode=Mode.PRIVATE)
    redondeo1_piece_11 = redondeo1_piece_11a & redondeo1_piece_11b
    add(redondeo1_piece_11)

    # Chaflán1
    # the kernel refuses this chamfer: 3 mm, written as the material it takes off along each edge
    with BuildSketch(Plane(origin=(28.789887219, -49.39121286, -1.035194012), x_dir=(-0.7071067811865446, 0.500000000000004, -0.5000000000000001), z_dir=(-0.7071067811865506, -0.5000000000000006, 0.4999999999999953))) as chafl_n1_piece_1:
        Polygon((CHAFL_N1_SIZE, 0), (0, -CHAFL_N1_SIZE), (0, 0), align=None)
    extrude(amount=18.430097928, mode=Mode.SUBTRACT)
    with BuildSketch(Plane(origin=(28.789887219, -21.106941612, 27.249077236), x_dir=(-0.7071067811865446, 0.5000000000000879, -0.49999999999991623), z_dir=(-0.7071067811865506, -0.5000000000000006, 0.4999999999999953)), Plane(origin=(-15.757839996, -58.606261823, 8.179854952), x_dir=(0, 0.707106781186544, 0.7071067811865511), z_dir=(-0.7071067811865535, 0.4999999999999984, -0.49999999999999317)), Plane(origin=(-15.757839996, -30.321990576, 36.4641262), x_dir=(0.7071067811865416, 0.50000000000009, -0.49999999999991834), z_dir=(-0.7071067811865535, 0.4999999999999984, -0.49999999999999317))) as chafl_n1_piece_2:
        Polygon((CHAFL_N1_SIZE, 0), (0, CHAFL_N1_SIZE), (0, 0), align=None)
    extrude(amount=18.430097928, mode=Mode.SUBTRACT)
    with BuildSketch(Plane(origin=(-36, -12, -7.715048964), x_dir=(0, 1, 0), z_dir=(0, 0, 1)), Plane(origin=(-36, 12, -7.715048964), x_dir=(1, 0, 0), z_dir=(0, 0, 1))) as chafl_n1_piece_3:
        Polygon((CHAFL_N1_SIZE, 0), (0, -CHAFL_N1_SIZE), (0, 0), align=None)
    extrude(amount=19.430097928, mode=Mode.SUBTRACT)
    with BuildSketch(Plane(origin=(17.47617872, -45.267427059, 12.518689717), x_dir=(0.7071067811865496, 0.5000000000000003, -0.49999999999999684), z_dir=(-0.7071067811865456, 0.5000000000000039, -0.49999999999999906))) as chafl_n1_piece_4_section:
        Polygon((CHAFL_N1_SIZE, 0), (0, -CHAFL_N1_SIZE), (0, 0), align=None)
    chafl_n1_piece_4 = extrude(amount=23.430097928, mode=Mode.PRIVATE)
    chafl_n1_piece_4 = split(chafl_n1_piece_4, bisect_by=Plane(origin=(18.890392282, -44.267427059, 11.518689717), z_dir=(-0.7071067811865606, -0.49999999999999345, 0.4999999999999882)), keep=Keep.TOP, mode=Mode.PRIVATE)
    add(chafl_n1_piece_4, mode=Mode.SUBTRACT)
    with BuildSketch(Plane(origin=(-0.908597591, -33.552378095, 0.803640753), x_dir=(-0.7071067811865586, 0.49999999999999445, -0.49999999999999), z_dir=(-0.7071067811865365, -0.5000000000000099, 0.5000000000000058))) as chafl_n1_piece_5_section:
        Polygon((CHAFL_N1_SIZE, 0), (0, -CHAFL_N1_SIZE), (0, 0), align=None)
    chafl_n1_piece_5 = extrude(amount=23.430097928, mode=Mode.PRIVATE)
    chafl_n1_piece_5 = split(chafl_n1_piece_5, bisect_by=Plane(origin=(-2.322811153, -32.552378095, -0.196359247), z_dir=(0.7071067811865478, -0.5000000000000027, 0.4999999999999969)), keep=Keep.TOP, mode=Mode.PRIVATE)
    add(chafl_n1_piece_5, mode=Mode.SUBTRACT)
    with BuildSketch(Plane(origin=(-17.47617872, -51.631388089, 6.154728686), x_dir=(-0.7071067811865586, 0.49999999999999495, -0.49999999999998934), z_dir=(0.7071067811865365, 0.5000000000000046, -0.5000000000000111))) as chafl_n1_piece_6_section:
        Polygon((CHAFL_N1_SIZE, 0), (0, -CHAFL_N1_SIZE), (0, 0), align=None)
    chafl_n1_piece_6 = extrude(amount=23.430097928, mode=Mode.PRIVATE)
    chafl_n1_piece_6 = split(chafl_n1_piece_6, bisect_by=Plane(origin=(-18.890392282, -50.631388089, 5.154728686), z_dir=(0.7071067811865478, -0.5000000000000027, 0.4999999999999969)), keep=Keep.TOP, mode=Mode.PRIVATE)
    add(chafl_n1_piece_6, mode=Mode.SUBTRACT)
    with BuildSketch(Plane(origin=(0.908597591, -39.916339125, -5.560320277), x_dir=(0.7071067811865496, 0.5000000000000003, -0.4999999999999967), z_dir=(0.7071067811865456, -0.5000000000000033, 0.49999999999999967))) as chafl_n1_piece_7_section:
        Polygon((CHAFL_N1_SIZE, 0), (0, -CHAFL_N1_SIZE), (0, 0), align=None)
    chafl_n1_piece_7 = extrude(amount=23.430097928, mode=Mode.PRIVATE)
    chafl_n1_piece_7 = split(chafl_n1_piece_7, bisect_by=Plane(origin=(2.322811153, -38.916339125, -6.560320277), z_dir=(-0.7071067811865606, -0.49999999999999345, 0.4999999999999882)), keep=Keep.TOP, mode=Mode.PRIVATE)
    add(chafl_n1_piece_7, mode=Mode.SUBTRACT)

    # Croquis20 → Saliente-Extruir6 (add)
    with BuildSketch(Plane(origin=(0, 0, 0), x_dir=(-1, 0, 0), z_dir=(0, 0, -1))):
        with Locations((0, -18)):
            Rectangle(CROQUIS20_W, CROQUIS20_H)
    extrude(amount=-SALIENTE_EXTRUIR6_DEPTH)

    # Croquis23 → Cortar-Extruir13 (cut)
    with BuildSketch(Plane(origin=(0, -25.213203436, -25.213203436), x_dir=(1, 0, 0), z_dir=(0, -0.7071067811865437, -0.7071067811865513)).offset(CORTAR_EXTRUIR13_START)):
        with BuildLine():
            Line((14.919953083, 32.647875144), (19.091883092, 36.819805153))
            ThreePointArc((19.091883092, 36.819805153), (19.798989873, 37.112698372), (20.506096654, 36.819805153))
            Line((20.506096654, 36.819805153), (21.920310217, 38.234018716))
            ThreePointArc((21.920310217, 38.234018716), (19.798989873, 39.112698372), (17.67766953, 38.234018716))
            Line((17.67766953, 38.234018716), (13.505739521, 34.062088707))
            ThreePointArc((13.505739521, 34.062088707), (12.627059864, 31.940768363), (13.505739521, 29.81944802))
            Line((13.505739521, 29.81944802), (14.919953083, 31.233661582))
            ThreePointArc((14.919953083, 31.233661582), (14.627059864, 31.940768363), (14.919953083, 32.647875144))
        make_face()
    extrude(amount=-CORTAR_EXTRUIR13_DEPTH, mode=Mode.SUBTRACT)


solid = part.part
